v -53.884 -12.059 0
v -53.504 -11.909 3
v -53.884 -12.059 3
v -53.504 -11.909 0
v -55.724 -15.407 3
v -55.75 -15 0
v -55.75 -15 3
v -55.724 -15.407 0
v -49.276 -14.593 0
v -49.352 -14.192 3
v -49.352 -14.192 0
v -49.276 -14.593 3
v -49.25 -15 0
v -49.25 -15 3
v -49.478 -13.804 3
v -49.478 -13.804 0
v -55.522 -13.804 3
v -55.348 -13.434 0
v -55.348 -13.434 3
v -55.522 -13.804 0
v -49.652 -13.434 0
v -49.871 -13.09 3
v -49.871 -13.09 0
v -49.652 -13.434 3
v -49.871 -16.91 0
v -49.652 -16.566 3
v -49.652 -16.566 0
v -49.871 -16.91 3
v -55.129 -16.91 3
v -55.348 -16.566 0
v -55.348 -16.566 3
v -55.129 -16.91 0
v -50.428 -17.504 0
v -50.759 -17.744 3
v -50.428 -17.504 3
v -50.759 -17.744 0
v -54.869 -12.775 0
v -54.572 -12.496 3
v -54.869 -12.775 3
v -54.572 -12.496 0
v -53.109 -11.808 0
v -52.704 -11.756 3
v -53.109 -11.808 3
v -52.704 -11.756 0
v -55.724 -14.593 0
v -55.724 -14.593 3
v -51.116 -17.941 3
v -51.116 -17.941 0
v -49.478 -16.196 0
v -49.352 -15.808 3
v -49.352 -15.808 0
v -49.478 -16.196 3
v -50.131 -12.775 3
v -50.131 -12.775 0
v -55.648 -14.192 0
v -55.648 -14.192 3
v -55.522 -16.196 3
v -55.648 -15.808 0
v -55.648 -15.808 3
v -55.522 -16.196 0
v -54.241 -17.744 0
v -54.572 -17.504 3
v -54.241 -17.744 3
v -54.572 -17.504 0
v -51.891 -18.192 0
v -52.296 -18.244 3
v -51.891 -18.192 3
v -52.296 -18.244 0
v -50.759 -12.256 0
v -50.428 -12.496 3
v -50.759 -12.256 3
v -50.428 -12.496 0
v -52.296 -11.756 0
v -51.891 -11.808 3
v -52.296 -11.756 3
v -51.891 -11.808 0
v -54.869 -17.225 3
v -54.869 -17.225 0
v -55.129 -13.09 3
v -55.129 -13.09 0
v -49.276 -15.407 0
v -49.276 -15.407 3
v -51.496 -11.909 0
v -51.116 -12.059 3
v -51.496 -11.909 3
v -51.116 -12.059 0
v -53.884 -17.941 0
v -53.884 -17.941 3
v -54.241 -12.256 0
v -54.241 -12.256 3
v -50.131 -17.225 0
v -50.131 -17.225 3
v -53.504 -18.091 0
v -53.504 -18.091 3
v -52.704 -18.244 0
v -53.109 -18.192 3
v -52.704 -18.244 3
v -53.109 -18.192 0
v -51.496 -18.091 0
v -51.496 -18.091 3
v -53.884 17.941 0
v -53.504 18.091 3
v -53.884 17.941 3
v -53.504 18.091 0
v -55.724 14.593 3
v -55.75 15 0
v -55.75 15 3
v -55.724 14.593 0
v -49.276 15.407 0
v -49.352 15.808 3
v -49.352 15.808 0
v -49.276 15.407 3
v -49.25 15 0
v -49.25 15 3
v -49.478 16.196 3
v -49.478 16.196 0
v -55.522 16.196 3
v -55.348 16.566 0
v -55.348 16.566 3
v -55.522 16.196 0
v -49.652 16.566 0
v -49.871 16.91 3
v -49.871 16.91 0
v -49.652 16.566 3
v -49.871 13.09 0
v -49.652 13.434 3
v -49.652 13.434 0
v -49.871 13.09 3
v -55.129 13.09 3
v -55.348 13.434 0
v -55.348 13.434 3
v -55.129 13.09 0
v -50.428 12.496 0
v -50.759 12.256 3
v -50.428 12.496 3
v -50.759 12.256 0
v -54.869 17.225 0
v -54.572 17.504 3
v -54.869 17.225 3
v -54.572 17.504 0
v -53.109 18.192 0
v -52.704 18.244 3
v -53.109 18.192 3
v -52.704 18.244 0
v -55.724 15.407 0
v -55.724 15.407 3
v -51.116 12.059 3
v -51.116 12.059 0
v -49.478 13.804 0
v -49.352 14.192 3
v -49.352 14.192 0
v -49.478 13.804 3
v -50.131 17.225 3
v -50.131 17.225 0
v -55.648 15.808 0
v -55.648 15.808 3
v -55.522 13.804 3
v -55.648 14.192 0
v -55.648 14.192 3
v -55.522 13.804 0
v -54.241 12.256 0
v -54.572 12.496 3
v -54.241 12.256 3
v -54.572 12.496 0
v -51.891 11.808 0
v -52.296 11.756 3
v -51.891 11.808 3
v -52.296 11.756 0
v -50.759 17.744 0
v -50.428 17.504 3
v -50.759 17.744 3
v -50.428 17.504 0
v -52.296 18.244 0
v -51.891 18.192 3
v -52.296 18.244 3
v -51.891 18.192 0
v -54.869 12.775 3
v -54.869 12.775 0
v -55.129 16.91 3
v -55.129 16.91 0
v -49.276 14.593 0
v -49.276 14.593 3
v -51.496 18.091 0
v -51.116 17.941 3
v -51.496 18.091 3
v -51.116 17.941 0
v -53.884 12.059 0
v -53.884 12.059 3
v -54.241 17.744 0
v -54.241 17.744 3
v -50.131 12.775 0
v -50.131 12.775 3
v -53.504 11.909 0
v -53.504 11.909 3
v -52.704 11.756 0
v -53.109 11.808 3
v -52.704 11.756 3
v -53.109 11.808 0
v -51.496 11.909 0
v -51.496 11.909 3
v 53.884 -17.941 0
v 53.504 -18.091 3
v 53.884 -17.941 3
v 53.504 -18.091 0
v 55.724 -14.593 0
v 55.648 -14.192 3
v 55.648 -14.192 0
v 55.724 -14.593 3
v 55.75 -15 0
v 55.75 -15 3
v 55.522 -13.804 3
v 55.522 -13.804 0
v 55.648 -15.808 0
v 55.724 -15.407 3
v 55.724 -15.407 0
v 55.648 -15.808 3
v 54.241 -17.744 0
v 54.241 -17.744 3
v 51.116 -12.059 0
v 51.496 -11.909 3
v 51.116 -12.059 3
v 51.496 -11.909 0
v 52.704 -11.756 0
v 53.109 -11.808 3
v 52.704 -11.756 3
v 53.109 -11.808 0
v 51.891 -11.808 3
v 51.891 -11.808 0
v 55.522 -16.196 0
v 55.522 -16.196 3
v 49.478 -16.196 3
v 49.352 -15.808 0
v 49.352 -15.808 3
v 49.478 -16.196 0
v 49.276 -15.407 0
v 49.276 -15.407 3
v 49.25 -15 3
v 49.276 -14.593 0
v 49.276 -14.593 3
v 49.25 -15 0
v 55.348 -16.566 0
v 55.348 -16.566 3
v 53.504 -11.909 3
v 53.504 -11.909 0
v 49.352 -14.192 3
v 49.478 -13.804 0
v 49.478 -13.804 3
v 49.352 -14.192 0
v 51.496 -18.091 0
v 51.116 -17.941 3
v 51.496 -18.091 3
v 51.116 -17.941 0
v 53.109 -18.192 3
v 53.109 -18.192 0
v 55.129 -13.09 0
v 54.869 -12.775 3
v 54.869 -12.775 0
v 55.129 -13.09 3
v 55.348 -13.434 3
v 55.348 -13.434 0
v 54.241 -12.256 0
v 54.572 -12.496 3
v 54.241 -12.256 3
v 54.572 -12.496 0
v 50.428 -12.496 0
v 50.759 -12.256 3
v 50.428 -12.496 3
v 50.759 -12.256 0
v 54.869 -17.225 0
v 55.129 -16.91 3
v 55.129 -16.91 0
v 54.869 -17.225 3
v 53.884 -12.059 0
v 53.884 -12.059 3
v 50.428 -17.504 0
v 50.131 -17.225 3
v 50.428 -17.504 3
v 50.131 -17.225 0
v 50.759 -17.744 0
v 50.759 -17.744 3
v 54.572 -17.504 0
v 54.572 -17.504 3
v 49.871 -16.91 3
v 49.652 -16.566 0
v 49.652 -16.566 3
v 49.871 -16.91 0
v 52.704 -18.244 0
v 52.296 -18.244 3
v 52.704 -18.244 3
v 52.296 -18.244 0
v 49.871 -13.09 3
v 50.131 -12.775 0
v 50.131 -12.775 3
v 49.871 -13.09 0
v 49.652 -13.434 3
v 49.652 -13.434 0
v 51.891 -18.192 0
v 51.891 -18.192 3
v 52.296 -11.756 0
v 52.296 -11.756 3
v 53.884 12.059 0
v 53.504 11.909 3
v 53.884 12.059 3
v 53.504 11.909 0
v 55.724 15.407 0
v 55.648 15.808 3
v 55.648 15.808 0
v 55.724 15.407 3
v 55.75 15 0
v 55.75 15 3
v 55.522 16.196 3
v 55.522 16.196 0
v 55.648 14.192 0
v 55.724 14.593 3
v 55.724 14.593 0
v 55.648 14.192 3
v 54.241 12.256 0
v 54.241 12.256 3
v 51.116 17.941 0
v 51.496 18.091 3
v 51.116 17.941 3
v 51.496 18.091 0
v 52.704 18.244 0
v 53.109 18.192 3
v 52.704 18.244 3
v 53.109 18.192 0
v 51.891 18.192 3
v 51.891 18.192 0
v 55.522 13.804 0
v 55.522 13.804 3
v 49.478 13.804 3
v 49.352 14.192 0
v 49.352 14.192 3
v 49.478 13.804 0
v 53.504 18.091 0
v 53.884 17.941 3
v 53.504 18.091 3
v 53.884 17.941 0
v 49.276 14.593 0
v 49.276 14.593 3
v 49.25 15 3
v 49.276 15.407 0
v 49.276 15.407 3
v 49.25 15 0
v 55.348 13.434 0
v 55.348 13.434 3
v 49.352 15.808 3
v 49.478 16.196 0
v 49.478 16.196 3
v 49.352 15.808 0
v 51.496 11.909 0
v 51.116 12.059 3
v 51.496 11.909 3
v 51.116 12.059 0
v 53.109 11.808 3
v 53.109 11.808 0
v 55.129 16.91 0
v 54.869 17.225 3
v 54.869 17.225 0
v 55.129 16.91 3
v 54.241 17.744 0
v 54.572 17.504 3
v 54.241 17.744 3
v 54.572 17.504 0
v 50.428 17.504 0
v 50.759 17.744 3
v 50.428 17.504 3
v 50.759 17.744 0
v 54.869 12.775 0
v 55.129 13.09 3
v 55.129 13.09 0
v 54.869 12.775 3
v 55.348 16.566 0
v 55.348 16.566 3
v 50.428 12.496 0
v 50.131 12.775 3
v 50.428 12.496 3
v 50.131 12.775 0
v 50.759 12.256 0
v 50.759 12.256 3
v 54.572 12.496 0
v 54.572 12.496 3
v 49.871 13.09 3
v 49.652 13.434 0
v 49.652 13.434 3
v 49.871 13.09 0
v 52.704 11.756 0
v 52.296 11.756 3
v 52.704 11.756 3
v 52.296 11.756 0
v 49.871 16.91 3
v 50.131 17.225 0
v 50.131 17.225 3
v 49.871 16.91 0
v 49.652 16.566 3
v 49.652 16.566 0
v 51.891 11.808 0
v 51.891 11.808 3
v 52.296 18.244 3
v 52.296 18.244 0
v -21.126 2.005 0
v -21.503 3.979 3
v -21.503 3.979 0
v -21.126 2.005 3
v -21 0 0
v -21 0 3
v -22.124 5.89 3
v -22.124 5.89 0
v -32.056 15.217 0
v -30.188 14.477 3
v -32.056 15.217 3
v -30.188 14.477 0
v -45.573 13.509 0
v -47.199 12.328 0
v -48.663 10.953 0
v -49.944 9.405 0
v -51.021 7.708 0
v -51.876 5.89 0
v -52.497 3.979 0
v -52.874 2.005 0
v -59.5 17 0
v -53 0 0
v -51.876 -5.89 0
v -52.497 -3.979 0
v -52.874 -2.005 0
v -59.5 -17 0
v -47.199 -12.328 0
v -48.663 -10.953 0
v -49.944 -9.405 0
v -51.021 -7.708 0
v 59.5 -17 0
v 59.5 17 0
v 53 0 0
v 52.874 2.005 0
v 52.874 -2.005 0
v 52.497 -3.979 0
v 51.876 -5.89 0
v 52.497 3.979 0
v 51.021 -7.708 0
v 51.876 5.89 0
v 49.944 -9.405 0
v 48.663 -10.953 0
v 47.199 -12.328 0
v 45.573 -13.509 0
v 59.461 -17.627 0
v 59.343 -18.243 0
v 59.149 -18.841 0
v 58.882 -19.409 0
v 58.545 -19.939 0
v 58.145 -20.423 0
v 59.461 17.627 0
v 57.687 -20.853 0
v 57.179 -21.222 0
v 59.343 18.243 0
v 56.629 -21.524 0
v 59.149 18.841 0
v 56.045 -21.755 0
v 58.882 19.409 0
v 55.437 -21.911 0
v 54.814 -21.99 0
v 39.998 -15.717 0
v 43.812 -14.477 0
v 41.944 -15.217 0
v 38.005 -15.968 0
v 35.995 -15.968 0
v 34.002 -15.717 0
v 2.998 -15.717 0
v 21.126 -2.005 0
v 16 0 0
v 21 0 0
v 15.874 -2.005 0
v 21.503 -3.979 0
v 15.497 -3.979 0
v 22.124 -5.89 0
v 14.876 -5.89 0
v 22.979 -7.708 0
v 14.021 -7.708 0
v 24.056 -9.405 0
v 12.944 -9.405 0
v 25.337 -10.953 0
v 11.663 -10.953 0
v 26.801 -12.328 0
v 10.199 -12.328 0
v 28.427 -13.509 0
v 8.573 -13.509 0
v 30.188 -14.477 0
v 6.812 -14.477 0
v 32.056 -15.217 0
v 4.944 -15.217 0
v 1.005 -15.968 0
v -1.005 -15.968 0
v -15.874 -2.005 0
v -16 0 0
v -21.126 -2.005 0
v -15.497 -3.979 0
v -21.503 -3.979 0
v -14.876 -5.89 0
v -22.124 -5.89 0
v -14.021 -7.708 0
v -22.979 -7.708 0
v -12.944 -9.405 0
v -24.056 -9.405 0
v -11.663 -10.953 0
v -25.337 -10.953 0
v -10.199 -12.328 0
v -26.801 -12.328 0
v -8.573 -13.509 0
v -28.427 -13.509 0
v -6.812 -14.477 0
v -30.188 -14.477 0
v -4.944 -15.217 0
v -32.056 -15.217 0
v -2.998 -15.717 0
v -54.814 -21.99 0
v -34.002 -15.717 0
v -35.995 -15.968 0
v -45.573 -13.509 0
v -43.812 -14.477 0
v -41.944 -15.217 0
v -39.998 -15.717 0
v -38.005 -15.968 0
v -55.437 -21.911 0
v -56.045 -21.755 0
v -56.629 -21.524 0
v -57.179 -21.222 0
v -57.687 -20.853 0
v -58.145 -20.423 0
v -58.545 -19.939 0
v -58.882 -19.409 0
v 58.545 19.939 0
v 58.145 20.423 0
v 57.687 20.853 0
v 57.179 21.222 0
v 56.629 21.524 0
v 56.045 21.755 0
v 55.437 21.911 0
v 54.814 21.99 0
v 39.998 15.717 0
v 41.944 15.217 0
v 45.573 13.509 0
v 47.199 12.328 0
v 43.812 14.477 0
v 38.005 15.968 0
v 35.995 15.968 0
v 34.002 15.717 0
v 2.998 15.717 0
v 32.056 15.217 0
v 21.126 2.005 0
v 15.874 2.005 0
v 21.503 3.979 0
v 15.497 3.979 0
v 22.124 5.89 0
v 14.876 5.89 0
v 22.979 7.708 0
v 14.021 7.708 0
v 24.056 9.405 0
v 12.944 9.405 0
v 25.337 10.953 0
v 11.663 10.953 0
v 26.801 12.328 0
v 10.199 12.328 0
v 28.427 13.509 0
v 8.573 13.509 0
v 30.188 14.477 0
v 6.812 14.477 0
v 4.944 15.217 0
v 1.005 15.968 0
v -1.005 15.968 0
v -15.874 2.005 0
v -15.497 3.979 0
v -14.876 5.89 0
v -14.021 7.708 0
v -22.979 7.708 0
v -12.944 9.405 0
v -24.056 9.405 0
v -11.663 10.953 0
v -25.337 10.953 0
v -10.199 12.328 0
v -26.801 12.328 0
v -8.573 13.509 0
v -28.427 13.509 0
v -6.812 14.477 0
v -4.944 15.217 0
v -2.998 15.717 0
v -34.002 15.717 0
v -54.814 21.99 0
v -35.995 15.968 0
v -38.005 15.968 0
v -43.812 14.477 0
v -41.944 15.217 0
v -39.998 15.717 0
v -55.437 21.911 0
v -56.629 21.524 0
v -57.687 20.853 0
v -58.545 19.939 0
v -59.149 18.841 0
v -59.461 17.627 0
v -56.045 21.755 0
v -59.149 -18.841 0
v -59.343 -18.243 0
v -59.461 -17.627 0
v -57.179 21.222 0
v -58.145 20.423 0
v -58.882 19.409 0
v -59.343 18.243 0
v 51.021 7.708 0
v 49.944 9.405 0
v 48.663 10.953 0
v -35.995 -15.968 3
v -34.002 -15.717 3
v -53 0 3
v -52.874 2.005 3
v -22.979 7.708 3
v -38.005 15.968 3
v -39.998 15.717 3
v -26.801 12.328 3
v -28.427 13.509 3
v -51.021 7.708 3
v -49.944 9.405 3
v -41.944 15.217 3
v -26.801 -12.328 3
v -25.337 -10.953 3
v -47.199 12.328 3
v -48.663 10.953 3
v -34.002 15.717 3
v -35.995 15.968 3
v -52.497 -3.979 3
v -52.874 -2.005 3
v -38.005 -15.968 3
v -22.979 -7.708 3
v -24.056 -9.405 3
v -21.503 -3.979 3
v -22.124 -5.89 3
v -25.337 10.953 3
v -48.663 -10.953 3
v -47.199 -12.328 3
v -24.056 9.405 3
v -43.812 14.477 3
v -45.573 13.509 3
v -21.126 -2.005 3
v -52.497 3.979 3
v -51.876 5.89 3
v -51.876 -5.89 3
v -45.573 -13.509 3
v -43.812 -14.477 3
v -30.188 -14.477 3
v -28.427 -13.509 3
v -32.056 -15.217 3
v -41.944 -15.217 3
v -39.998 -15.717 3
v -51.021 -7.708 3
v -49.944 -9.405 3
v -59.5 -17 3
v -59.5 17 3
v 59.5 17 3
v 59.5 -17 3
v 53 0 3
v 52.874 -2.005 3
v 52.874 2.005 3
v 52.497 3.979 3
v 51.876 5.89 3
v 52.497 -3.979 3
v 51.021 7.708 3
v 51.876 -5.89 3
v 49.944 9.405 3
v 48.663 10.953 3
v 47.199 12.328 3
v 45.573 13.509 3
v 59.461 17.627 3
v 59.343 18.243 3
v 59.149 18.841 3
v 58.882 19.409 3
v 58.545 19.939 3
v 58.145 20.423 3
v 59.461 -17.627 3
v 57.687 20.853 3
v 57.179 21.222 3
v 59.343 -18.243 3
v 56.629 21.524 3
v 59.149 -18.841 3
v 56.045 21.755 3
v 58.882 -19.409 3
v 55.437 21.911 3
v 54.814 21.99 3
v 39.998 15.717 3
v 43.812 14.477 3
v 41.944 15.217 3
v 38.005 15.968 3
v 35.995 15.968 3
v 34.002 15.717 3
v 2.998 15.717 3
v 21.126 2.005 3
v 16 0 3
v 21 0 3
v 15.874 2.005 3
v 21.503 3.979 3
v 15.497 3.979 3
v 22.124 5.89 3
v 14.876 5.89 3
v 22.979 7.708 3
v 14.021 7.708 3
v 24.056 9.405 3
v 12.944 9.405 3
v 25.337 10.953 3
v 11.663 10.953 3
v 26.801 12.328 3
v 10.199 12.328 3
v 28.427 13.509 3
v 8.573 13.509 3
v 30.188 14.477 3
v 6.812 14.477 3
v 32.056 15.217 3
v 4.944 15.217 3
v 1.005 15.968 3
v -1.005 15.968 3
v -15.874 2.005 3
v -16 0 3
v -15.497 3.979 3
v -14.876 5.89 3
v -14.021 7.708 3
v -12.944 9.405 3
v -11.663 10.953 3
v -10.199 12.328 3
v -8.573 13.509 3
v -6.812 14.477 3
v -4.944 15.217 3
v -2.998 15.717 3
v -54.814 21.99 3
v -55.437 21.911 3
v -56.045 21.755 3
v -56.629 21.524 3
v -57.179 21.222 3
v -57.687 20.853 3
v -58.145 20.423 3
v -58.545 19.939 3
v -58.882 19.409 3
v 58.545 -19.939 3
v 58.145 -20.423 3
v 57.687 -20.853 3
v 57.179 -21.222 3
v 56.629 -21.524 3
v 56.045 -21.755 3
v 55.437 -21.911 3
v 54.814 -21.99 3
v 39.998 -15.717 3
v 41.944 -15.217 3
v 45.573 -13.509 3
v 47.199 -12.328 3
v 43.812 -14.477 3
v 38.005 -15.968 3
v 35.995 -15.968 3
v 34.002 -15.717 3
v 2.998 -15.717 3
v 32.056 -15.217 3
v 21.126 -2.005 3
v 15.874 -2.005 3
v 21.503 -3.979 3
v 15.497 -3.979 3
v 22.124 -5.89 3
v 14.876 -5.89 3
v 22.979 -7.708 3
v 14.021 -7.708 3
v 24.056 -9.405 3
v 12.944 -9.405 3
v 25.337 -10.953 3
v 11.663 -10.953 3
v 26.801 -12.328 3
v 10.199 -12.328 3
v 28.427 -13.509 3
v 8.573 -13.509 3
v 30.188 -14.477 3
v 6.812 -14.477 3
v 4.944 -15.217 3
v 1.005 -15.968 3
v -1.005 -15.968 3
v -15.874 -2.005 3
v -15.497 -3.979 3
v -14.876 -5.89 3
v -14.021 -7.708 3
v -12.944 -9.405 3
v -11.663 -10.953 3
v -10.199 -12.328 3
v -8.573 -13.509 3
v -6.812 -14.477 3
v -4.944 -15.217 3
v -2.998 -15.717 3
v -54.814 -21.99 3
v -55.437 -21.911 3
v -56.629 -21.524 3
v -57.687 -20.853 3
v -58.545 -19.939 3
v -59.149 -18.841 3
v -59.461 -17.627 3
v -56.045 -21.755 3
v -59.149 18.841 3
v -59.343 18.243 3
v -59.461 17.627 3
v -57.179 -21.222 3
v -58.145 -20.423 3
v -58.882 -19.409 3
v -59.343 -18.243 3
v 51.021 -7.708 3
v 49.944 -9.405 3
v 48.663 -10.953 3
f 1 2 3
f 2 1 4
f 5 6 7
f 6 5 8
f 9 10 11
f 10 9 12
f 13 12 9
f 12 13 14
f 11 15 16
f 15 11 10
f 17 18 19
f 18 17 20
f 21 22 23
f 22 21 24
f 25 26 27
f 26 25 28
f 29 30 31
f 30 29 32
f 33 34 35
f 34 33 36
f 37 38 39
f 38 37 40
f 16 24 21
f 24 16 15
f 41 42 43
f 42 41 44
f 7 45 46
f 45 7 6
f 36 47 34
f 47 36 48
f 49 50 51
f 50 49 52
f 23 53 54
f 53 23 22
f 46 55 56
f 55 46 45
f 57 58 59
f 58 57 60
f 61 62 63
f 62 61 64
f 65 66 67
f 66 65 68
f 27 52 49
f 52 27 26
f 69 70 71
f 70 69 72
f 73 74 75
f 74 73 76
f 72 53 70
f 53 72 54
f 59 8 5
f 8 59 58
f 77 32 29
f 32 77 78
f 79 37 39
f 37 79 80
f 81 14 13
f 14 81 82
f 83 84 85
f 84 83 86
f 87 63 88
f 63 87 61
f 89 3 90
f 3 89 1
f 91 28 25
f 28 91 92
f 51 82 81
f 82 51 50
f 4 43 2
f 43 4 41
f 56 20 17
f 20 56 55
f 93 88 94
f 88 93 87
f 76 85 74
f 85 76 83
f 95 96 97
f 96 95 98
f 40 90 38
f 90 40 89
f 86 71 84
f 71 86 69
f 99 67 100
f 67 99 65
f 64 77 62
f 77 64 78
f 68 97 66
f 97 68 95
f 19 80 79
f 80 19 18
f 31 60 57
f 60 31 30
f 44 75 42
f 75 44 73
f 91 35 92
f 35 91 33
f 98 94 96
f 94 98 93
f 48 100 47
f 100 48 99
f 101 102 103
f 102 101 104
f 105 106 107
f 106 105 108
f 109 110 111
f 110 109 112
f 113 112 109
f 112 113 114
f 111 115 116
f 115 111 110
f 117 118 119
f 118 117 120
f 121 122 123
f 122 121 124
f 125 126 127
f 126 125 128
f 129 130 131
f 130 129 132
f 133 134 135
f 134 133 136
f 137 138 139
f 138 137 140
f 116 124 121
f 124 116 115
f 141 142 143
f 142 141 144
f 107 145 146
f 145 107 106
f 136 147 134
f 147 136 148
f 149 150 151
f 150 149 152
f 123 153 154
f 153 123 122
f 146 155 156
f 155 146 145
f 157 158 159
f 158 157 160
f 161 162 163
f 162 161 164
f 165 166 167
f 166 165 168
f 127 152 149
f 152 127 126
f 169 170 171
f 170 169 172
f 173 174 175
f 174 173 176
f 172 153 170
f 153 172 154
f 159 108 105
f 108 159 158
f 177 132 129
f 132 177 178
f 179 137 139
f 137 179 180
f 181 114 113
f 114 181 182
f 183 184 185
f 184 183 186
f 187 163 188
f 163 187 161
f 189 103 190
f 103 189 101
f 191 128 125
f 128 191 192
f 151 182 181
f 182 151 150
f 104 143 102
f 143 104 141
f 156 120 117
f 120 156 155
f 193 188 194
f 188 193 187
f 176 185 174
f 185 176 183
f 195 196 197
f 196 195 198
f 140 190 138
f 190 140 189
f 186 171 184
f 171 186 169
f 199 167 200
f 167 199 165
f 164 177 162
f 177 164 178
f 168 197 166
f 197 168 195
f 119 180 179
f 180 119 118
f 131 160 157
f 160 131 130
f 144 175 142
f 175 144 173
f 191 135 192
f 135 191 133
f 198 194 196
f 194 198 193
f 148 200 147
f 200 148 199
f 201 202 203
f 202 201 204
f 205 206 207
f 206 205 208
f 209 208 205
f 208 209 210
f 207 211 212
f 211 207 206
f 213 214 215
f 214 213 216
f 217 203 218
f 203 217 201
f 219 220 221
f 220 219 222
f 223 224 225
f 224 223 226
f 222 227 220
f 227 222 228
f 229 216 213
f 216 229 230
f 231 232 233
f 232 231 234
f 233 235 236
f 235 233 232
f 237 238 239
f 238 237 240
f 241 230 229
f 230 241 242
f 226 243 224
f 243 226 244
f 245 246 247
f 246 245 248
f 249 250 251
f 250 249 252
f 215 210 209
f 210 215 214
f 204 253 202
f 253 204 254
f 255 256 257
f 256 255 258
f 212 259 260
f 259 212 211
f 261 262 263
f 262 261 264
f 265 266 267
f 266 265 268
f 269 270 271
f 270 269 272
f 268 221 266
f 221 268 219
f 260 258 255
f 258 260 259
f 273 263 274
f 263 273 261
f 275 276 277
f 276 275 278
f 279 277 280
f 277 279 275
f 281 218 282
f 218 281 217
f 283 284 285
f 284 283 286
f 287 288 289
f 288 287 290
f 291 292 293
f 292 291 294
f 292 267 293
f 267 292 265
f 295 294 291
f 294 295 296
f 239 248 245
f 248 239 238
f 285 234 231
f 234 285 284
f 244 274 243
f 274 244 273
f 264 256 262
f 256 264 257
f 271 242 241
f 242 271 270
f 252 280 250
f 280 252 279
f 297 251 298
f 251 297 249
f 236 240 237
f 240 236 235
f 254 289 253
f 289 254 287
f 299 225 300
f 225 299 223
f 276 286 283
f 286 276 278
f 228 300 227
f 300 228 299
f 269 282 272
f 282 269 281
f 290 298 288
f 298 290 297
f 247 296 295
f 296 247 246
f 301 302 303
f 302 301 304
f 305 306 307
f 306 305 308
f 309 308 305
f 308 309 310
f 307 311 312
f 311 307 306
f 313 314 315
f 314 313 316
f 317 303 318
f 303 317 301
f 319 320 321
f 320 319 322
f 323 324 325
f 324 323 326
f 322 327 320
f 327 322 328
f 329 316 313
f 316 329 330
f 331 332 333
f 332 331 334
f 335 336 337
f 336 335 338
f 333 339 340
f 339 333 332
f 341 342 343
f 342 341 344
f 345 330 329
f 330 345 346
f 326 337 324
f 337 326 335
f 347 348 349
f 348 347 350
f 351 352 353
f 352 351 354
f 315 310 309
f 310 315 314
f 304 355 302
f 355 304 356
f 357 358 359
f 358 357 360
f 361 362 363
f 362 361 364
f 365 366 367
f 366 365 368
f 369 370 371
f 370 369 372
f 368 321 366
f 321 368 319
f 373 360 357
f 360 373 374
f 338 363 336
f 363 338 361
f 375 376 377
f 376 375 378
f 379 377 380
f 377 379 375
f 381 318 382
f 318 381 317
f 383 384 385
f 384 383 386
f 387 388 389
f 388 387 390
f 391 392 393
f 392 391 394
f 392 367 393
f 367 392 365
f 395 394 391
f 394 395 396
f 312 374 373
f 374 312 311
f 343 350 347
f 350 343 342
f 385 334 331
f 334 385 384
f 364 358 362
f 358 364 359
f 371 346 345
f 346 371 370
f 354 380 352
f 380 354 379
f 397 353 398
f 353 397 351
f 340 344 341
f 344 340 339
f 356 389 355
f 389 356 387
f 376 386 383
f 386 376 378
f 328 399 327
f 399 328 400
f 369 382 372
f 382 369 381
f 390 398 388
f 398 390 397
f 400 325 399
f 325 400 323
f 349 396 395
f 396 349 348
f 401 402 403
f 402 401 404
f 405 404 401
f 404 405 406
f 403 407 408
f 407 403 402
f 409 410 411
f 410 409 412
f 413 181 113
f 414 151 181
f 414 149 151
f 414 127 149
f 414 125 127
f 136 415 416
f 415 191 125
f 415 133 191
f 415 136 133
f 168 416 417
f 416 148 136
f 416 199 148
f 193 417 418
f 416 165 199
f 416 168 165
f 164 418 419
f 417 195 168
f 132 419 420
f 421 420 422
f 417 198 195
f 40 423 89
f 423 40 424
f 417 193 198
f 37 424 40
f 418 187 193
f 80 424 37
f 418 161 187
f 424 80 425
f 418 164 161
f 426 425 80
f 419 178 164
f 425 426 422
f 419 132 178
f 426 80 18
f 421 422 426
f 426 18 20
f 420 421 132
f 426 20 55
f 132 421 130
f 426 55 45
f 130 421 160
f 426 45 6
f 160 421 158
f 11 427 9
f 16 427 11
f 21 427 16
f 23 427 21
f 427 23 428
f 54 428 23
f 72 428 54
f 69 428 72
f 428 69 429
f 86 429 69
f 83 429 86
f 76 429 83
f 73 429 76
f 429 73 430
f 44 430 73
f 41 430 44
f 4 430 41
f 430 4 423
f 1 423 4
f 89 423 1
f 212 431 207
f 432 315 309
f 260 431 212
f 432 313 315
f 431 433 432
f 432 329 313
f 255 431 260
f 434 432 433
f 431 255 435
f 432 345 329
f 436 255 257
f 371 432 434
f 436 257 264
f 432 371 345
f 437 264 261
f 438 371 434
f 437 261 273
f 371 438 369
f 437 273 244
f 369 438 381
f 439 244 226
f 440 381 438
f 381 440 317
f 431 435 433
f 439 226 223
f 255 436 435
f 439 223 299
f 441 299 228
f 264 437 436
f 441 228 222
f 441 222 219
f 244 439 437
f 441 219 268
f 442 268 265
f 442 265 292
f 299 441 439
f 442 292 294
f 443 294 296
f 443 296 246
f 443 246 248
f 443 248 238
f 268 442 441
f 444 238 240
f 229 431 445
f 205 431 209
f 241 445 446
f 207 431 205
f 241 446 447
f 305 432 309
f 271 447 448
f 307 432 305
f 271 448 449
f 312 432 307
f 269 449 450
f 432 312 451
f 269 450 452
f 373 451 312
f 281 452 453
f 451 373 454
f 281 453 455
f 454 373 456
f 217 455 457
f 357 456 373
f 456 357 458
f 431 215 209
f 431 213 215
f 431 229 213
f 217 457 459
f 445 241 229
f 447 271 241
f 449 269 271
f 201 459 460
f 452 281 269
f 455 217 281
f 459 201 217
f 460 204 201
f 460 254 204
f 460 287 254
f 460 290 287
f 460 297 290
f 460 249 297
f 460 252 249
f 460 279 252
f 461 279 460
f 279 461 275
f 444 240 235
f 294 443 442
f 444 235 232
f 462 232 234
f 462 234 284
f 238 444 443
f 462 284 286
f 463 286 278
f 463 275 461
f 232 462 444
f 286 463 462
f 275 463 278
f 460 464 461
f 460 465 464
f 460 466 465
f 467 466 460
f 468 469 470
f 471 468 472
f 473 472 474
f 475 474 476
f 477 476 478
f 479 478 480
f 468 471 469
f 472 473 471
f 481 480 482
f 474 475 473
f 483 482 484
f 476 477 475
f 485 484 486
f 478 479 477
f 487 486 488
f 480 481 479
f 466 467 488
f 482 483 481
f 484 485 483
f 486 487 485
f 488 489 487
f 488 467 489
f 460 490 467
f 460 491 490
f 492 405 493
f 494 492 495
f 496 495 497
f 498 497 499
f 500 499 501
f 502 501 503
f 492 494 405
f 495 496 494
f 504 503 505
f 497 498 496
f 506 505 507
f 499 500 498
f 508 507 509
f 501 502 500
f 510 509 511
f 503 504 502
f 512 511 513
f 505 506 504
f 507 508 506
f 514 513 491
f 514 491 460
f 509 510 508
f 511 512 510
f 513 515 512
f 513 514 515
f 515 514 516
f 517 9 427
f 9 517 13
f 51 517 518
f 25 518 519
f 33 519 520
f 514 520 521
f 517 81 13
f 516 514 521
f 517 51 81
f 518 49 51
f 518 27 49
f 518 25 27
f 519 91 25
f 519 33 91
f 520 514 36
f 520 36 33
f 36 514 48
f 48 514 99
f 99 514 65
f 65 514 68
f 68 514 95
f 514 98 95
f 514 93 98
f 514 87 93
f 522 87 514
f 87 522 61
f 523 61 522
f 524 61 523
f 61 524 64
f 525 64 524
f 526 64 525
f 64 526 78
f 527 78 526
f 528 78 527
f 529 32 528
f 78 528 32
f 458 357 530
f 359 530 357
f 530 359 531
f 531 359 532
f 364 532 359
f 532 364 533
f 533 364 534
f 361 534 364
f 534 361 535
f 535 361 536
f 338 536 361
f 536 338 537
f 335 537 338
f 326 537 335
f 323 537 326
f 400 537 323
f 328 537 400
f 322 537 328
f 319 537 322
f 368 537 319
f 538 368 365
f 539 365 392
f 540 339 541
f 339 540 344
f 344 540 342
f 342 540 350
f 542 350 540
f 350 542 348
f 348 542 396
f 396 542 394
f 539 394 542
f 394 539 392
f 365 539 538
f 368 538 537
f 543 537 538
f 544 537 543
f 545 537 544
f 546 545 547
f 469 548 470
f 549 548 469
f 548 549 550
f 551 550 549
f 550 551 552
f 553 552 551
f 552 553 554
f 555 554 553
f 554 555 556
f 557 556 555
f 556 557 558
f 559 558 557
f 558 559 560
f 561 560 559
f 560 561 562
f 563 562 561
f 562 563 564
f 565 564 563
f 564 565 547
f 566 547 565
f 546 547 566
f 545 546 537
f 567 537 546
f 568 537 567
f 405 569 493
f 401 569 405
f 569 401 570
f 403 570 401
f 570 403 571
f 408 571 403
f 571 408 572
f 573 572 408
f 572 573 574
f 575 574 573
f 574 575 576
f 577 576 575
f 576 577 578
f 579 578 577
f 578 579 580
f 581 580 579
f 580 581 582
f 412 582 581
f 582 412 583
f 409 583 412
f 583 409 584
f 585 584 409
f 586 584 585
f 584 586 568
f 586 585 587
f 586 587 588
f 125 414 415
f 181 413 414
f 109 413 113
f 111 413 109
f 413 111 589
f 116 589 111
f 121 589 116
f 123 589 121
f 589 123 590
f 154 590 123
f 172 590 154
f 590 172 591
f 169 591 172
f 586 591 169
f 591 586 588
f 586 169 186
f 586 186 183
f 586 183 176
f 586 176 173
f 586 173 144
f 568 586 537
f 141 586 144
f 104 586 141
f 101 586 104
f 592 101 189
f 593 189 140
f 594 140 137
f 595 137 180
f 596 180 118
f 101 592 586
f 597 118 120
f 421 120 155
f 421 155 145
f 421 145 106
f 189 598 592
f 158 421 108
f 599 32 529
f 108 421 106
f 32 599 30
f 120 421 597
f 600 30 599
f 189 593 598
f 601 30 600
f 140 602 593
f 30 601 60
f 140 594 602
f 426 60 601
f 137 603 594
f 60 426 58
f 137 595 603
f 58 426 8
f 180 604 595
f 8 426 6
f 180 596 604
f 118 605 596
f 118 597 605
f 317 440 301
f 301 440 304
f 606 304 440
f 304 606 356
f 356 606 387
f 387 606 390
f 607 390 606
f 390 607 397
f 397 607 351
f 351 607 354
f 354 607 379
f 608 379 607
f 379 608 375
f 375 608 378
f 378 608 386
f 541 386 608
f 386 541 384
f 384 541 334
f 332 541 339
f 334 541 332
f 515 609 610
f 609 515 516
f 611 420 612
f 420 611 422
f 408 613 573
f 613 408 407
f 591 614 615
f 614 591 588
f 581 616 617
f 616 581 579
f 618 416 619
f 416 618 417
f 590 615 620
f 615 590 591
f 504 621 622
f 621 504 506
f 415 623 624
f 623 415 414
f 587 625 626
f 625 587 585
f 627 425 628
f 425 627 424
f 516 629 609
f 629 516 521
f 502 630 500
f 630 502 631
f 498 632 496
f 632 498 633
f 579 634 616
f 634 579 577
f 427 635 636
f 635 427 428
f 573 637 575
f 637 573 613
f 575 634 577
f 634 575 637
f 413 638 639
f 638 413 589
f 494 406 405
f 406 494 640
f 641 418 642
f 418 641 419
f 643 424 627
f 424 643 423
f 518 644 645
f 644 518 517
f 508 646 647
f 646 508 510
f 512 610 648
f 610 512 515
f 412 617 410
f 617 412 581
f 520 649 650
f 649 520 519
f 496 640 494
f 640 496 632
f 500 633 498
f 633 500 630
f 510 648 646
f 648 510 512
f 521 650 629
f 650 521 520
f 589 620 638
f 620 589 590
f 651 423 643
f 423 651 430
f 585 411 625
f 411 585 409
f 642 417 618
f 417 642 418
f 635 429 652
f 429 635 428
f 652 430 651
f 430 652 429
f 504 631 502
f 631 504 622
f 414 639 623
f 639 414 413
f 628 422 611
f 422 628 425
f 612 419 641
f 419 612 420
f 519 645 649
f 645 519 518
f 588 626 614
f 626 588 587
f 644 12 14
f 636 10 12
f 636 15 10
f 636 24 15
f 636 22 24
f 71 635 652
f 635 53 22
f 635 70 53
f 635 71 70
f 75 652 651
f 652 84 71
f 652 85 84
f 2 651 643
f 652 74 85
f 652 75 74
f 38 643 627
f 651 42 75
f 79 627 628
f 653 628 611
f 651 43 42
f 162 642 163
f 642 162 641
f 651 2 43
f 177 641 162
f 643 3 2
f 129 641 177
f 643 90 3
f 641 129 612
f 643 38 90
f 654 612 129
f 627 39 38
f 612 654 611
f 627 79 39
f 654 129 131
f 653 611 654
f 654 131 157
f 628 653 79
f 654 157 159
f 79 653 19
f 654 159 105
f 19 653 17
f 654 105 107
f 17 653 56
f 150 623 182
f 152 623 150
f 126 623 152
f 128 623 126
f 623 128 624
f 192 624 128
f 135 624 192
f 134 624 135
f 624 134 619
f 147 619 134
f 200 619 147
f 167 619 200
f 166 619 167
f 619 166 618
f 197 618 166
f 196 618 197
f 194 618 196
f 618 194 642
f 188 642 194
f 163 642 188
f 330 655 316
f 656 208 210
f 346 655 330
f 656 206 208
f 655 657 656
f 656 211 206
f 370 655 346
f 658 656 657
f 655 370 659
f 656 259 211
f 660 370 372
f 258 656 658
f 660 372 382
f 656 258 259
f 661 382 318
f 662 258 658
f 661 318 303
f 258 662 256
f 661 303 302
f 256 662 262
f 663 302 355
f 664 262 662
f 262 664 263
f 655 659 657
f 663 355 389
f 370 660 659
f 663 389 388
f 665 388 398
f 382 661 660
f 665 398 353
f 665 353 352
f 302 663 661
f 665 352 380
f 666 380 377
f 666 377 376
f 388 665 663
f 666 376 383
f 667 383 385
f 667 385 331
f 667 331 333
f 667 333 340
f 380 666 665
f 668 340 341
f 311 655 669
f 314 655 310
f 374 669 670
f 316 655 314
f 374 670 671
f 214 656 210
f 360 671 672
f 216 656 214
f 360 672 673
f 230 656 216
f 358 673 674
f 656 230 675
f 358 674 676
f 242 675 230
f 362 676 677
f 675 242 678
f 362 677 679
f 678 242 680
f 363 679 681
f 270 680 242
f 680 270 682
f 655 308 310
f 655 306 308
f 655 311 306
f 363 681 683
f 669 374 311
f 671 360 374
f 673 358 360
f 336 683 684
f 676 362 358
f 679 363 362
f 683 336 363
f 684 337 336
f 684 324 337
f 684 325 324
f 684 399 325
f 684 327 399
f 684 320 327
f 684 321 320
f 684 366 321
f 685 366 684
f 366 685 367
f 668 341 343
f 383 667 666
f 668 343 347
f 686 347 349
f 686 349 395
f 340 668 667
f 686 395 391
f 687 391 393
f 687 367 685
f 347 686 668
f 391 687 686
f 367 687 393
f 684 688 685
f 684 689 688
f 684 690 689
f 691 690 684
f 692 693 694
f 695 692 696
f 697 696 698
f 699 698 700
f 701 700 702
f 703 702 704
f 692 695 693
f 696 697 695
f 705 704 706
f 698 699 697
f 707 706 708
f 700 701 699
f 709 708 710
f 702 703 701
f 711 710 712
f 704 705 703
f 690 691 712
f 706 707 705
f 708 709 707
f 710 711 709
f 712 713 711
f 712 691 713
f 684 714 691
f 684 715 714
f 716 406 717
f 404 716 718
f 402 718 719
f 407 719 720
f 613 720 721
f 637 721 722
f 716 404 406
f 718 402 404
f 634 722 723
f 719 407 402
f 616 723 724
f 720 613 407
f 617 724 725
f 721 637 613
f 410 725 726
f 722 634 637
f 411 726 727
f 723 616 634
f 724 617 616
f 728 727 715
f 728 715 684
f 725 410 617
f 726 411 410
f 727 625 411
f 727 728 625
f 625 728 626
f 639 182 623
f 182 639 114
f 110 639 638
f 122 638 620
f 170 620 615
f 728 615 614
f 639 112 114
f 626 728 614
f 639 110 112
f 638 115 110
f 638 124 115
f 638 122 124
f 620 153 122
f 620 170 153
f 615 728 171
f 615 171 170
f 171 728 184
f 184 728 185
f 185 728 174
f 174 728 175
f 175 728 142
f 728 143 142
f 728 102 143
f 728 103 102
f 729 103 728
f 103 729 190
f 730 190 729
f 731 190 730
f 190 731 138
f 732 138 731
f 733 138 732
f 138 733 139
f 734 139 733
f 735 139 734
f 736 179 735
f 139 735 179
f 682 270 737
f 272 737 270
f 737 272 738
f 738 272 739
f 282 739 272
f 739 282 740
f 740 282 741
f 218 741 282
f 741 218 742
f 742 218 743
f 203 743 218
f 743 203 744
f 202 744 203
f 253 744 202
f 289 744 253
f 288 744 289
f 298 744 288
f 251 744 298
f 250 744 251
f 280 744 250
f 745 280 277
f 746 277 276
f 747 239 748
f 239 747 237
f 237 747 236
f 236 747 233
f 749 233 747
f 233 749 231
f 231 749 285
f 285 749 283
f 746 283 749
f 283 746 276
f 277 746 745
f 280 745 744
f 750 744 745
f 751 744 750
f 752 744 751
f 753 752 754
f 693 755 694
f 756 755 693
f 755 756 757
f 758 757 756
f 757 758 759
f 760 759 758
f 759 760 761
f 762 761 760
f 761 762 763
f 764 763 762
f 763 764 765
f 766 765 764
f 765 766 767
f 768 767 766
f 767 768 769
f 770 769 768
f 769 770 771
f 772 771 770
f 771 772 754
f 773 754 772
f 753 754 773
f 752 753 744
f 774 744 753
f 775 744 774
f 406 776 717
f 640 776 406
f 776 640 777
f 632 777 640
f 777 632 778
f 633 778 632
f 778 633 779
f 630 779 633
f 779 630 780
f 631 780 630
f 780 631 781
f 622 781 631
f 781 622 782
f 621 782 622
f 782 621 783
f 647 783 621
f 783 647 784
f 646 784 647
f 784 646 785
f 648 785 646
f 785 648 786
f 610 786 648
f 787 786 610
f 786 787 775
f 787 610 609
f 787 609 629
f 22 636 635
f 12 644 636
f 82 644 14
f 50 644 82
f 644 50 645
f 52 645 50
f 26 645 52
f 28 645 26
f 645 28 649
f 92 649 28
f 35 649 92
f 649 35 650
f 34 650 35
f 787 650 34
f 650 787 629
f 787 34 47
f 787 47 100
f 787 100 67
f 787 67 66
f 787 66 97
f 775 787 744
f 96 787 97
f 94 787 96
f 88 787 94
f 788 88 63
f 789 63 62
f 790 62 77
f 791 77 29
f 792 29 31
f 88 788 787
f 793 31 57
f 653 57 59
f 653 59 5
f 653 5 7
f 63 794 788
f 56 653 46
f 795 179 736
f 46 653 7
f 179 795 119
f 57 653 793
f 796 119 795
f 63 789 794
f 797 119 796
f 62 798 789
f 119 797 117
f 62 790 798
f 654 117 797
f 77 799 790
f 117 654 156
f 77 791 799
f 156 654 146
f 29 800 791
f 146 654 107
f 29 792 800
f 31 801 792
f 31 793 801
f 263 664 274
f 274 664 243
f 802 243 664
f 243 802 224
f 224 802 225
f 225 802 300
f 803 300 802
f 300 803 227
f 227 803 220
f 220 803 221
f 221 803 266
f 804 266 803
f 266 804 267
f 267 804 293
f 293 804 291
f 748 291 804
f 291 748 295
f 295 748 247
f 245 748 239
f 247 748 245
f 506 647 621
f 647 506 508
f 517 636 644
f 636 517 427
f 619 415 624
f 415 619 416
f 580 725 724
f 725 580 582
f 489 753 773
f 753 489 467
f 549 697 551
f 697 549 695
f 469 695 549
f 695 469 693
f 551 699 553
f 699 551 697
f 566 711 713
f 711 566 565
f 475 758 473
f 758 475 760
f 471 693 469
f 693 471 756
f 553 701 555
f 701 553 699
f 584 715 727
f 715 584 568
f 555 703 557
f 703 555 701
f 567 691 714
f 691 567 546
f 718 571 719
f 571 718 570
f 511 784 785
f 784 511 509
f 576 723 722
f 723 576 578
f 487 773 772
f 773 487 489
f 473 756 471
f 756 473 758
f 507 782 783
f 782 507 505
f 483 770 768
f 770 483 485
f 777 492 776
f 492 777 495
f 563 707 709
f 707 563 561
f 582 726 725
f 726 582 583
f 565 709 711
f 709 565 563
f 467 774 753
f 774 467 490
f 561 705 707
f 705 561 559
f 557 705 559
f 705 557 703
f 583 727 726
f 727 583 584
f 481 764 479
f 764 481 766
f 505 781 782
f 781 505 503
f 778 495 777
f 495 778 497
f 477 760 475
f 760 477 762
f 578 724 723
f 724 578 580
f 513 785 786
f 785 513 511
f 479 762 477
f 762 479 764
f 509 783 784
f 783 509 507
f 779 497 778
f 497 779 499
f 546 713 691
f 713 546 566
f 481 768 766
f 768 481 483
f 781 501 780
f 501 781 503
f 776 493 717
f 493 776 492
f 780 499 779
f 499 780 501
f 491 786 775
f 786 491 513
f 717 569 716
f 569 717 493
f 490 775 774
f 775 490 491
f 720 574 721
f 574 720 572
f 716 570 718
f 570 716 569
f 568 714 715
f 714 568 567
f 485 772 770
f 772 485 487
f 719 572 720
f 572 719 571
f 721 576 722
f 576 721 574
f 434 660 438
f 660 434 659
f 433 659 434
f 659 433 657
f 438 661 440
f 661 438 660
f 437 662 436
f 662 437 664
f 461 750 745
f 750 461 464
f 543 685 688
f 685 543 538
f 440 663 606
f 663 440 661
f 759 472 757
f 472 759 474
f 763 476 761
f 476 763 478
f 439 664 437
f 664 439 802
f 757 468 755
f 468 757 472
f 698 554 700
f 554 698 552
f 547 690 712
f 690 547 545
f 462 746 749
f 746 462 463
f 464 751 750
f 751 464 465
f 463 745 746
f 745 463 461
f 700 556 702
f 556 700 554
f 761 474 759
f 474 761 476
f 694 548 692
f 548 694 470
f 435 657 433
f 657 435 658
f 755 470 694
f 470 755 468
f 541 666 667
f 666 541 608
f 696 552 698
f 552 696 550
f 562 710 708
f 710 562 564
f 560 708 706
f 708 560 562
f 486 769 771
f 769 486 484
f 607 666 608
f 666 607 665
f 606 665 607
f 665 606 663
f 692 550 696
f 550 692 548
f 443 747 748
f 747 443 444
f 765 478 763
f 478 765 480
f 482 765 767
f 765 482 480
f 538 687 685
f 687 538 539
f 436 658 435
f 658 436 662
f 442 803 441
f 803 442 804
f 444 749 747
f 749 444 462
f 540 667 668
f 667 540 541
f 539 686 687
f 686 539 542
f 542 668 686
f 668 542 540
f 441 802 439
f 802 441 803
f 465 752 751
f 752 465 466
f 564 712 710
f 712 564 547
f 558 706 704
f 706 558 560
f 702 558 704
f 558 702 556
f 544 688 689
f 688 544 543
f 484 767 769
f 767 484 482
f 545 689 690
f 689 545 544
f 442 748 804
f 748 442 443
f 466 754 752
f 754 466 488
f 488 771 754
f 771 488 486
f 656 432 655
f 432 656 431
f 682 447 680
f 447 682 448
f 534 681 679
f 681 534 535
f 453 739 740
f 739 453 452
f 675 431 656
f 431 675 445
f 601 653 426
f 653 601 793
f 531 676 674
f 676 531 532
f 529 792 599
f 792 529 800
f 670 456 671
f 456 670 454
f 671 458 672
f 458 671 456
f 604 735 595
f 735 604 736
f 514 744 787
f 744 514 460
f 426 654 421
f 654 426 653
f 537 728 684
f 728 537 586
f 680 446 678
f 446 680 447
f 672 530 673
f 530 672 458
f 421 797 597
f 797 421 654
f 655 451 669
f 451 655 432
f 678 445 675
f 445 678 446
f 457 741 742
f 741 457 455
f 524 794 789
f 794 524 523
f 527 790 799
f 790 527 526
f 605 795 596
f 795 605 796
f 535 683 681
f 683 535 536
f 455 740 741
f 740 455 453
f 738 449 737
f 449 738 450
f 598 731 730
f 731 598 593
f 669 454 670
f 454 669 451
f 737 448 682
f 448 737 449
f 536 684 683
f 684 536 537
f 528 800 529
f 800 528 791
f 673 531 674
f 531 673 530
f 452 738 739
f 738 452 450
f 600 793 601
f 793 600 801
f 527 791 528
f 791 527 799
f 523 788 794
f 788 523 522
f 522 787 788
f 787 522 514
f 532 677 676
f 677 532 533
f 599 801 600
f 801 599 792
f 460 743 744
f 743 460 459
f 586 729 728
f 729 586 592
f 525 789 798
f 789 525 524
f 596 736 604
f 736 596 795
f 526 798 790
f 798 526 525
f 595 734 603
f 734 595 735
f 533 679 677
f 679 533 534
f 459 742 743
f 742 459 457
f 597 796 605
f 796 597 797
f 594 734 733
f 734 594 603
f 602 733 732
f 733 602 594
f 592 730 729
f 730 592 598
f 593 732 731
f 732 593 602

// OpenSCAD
$fn = 50;

difference() {
	union() {
		hull() {
			translate(v = [-54.5, 17.0, 0]) {
				cylinder(h = 3, r = 5);
			}
			translate(v = [54.5, 17.0, 0]) {
				cylinder(h = 3, r = 5);
			}
			translate(v = [-54.5, -17.0, 0]) {
				cylinder(h = 3, r = 5);
			}
			translate(v = [54.5, -17.0, 0]) {
				cylinder(h = 3, r = 5);
			}
		}
	}
	union() {
		translate(v = [-52.5, -15.0, -100.0]) {
			cylinder(h = 200, r = 3.25);
		}
		translate(v = [-52.5, 15.0, -100.0]) {
			cylinder(h = 200, r = 3.25);
		}
		translate(v = [52.5, -15.0, -100.0]) {
			cylinder(h = 200, r = 3.25);
		}
		translate(v = [52.5, 15.0, -100.0]) {
			cylinder(h = 200, r = 3.25);
		}
		translate(v = [-52.5, -15.0, -100.0]) {
			cylinder(h = 200, r = 1.8);
		}
		translate(v = [-52.5, 15.0, -100.0]) {
			cylinder(h = 200, r = 1.8);
		}
		translate(v = [52.5, -15.0, -100.0]) {
			cylinder(h = 200, r = 1.8);
		}
		translate(v = [52.5, 15.0, -100.0]) {
			cylinder(h = 200, r = 1.8);
		}
		translate(v = [-37.0, 0, 0.0]) {
			cylinder(h = 3, r = 16.0);
		}
		cylinder(h = 3, r = 16.0);
		translate(v = [37.0, 0, 0.0]) {
			cylinder(h = 3, r = 16.0);
		}
	}
}
